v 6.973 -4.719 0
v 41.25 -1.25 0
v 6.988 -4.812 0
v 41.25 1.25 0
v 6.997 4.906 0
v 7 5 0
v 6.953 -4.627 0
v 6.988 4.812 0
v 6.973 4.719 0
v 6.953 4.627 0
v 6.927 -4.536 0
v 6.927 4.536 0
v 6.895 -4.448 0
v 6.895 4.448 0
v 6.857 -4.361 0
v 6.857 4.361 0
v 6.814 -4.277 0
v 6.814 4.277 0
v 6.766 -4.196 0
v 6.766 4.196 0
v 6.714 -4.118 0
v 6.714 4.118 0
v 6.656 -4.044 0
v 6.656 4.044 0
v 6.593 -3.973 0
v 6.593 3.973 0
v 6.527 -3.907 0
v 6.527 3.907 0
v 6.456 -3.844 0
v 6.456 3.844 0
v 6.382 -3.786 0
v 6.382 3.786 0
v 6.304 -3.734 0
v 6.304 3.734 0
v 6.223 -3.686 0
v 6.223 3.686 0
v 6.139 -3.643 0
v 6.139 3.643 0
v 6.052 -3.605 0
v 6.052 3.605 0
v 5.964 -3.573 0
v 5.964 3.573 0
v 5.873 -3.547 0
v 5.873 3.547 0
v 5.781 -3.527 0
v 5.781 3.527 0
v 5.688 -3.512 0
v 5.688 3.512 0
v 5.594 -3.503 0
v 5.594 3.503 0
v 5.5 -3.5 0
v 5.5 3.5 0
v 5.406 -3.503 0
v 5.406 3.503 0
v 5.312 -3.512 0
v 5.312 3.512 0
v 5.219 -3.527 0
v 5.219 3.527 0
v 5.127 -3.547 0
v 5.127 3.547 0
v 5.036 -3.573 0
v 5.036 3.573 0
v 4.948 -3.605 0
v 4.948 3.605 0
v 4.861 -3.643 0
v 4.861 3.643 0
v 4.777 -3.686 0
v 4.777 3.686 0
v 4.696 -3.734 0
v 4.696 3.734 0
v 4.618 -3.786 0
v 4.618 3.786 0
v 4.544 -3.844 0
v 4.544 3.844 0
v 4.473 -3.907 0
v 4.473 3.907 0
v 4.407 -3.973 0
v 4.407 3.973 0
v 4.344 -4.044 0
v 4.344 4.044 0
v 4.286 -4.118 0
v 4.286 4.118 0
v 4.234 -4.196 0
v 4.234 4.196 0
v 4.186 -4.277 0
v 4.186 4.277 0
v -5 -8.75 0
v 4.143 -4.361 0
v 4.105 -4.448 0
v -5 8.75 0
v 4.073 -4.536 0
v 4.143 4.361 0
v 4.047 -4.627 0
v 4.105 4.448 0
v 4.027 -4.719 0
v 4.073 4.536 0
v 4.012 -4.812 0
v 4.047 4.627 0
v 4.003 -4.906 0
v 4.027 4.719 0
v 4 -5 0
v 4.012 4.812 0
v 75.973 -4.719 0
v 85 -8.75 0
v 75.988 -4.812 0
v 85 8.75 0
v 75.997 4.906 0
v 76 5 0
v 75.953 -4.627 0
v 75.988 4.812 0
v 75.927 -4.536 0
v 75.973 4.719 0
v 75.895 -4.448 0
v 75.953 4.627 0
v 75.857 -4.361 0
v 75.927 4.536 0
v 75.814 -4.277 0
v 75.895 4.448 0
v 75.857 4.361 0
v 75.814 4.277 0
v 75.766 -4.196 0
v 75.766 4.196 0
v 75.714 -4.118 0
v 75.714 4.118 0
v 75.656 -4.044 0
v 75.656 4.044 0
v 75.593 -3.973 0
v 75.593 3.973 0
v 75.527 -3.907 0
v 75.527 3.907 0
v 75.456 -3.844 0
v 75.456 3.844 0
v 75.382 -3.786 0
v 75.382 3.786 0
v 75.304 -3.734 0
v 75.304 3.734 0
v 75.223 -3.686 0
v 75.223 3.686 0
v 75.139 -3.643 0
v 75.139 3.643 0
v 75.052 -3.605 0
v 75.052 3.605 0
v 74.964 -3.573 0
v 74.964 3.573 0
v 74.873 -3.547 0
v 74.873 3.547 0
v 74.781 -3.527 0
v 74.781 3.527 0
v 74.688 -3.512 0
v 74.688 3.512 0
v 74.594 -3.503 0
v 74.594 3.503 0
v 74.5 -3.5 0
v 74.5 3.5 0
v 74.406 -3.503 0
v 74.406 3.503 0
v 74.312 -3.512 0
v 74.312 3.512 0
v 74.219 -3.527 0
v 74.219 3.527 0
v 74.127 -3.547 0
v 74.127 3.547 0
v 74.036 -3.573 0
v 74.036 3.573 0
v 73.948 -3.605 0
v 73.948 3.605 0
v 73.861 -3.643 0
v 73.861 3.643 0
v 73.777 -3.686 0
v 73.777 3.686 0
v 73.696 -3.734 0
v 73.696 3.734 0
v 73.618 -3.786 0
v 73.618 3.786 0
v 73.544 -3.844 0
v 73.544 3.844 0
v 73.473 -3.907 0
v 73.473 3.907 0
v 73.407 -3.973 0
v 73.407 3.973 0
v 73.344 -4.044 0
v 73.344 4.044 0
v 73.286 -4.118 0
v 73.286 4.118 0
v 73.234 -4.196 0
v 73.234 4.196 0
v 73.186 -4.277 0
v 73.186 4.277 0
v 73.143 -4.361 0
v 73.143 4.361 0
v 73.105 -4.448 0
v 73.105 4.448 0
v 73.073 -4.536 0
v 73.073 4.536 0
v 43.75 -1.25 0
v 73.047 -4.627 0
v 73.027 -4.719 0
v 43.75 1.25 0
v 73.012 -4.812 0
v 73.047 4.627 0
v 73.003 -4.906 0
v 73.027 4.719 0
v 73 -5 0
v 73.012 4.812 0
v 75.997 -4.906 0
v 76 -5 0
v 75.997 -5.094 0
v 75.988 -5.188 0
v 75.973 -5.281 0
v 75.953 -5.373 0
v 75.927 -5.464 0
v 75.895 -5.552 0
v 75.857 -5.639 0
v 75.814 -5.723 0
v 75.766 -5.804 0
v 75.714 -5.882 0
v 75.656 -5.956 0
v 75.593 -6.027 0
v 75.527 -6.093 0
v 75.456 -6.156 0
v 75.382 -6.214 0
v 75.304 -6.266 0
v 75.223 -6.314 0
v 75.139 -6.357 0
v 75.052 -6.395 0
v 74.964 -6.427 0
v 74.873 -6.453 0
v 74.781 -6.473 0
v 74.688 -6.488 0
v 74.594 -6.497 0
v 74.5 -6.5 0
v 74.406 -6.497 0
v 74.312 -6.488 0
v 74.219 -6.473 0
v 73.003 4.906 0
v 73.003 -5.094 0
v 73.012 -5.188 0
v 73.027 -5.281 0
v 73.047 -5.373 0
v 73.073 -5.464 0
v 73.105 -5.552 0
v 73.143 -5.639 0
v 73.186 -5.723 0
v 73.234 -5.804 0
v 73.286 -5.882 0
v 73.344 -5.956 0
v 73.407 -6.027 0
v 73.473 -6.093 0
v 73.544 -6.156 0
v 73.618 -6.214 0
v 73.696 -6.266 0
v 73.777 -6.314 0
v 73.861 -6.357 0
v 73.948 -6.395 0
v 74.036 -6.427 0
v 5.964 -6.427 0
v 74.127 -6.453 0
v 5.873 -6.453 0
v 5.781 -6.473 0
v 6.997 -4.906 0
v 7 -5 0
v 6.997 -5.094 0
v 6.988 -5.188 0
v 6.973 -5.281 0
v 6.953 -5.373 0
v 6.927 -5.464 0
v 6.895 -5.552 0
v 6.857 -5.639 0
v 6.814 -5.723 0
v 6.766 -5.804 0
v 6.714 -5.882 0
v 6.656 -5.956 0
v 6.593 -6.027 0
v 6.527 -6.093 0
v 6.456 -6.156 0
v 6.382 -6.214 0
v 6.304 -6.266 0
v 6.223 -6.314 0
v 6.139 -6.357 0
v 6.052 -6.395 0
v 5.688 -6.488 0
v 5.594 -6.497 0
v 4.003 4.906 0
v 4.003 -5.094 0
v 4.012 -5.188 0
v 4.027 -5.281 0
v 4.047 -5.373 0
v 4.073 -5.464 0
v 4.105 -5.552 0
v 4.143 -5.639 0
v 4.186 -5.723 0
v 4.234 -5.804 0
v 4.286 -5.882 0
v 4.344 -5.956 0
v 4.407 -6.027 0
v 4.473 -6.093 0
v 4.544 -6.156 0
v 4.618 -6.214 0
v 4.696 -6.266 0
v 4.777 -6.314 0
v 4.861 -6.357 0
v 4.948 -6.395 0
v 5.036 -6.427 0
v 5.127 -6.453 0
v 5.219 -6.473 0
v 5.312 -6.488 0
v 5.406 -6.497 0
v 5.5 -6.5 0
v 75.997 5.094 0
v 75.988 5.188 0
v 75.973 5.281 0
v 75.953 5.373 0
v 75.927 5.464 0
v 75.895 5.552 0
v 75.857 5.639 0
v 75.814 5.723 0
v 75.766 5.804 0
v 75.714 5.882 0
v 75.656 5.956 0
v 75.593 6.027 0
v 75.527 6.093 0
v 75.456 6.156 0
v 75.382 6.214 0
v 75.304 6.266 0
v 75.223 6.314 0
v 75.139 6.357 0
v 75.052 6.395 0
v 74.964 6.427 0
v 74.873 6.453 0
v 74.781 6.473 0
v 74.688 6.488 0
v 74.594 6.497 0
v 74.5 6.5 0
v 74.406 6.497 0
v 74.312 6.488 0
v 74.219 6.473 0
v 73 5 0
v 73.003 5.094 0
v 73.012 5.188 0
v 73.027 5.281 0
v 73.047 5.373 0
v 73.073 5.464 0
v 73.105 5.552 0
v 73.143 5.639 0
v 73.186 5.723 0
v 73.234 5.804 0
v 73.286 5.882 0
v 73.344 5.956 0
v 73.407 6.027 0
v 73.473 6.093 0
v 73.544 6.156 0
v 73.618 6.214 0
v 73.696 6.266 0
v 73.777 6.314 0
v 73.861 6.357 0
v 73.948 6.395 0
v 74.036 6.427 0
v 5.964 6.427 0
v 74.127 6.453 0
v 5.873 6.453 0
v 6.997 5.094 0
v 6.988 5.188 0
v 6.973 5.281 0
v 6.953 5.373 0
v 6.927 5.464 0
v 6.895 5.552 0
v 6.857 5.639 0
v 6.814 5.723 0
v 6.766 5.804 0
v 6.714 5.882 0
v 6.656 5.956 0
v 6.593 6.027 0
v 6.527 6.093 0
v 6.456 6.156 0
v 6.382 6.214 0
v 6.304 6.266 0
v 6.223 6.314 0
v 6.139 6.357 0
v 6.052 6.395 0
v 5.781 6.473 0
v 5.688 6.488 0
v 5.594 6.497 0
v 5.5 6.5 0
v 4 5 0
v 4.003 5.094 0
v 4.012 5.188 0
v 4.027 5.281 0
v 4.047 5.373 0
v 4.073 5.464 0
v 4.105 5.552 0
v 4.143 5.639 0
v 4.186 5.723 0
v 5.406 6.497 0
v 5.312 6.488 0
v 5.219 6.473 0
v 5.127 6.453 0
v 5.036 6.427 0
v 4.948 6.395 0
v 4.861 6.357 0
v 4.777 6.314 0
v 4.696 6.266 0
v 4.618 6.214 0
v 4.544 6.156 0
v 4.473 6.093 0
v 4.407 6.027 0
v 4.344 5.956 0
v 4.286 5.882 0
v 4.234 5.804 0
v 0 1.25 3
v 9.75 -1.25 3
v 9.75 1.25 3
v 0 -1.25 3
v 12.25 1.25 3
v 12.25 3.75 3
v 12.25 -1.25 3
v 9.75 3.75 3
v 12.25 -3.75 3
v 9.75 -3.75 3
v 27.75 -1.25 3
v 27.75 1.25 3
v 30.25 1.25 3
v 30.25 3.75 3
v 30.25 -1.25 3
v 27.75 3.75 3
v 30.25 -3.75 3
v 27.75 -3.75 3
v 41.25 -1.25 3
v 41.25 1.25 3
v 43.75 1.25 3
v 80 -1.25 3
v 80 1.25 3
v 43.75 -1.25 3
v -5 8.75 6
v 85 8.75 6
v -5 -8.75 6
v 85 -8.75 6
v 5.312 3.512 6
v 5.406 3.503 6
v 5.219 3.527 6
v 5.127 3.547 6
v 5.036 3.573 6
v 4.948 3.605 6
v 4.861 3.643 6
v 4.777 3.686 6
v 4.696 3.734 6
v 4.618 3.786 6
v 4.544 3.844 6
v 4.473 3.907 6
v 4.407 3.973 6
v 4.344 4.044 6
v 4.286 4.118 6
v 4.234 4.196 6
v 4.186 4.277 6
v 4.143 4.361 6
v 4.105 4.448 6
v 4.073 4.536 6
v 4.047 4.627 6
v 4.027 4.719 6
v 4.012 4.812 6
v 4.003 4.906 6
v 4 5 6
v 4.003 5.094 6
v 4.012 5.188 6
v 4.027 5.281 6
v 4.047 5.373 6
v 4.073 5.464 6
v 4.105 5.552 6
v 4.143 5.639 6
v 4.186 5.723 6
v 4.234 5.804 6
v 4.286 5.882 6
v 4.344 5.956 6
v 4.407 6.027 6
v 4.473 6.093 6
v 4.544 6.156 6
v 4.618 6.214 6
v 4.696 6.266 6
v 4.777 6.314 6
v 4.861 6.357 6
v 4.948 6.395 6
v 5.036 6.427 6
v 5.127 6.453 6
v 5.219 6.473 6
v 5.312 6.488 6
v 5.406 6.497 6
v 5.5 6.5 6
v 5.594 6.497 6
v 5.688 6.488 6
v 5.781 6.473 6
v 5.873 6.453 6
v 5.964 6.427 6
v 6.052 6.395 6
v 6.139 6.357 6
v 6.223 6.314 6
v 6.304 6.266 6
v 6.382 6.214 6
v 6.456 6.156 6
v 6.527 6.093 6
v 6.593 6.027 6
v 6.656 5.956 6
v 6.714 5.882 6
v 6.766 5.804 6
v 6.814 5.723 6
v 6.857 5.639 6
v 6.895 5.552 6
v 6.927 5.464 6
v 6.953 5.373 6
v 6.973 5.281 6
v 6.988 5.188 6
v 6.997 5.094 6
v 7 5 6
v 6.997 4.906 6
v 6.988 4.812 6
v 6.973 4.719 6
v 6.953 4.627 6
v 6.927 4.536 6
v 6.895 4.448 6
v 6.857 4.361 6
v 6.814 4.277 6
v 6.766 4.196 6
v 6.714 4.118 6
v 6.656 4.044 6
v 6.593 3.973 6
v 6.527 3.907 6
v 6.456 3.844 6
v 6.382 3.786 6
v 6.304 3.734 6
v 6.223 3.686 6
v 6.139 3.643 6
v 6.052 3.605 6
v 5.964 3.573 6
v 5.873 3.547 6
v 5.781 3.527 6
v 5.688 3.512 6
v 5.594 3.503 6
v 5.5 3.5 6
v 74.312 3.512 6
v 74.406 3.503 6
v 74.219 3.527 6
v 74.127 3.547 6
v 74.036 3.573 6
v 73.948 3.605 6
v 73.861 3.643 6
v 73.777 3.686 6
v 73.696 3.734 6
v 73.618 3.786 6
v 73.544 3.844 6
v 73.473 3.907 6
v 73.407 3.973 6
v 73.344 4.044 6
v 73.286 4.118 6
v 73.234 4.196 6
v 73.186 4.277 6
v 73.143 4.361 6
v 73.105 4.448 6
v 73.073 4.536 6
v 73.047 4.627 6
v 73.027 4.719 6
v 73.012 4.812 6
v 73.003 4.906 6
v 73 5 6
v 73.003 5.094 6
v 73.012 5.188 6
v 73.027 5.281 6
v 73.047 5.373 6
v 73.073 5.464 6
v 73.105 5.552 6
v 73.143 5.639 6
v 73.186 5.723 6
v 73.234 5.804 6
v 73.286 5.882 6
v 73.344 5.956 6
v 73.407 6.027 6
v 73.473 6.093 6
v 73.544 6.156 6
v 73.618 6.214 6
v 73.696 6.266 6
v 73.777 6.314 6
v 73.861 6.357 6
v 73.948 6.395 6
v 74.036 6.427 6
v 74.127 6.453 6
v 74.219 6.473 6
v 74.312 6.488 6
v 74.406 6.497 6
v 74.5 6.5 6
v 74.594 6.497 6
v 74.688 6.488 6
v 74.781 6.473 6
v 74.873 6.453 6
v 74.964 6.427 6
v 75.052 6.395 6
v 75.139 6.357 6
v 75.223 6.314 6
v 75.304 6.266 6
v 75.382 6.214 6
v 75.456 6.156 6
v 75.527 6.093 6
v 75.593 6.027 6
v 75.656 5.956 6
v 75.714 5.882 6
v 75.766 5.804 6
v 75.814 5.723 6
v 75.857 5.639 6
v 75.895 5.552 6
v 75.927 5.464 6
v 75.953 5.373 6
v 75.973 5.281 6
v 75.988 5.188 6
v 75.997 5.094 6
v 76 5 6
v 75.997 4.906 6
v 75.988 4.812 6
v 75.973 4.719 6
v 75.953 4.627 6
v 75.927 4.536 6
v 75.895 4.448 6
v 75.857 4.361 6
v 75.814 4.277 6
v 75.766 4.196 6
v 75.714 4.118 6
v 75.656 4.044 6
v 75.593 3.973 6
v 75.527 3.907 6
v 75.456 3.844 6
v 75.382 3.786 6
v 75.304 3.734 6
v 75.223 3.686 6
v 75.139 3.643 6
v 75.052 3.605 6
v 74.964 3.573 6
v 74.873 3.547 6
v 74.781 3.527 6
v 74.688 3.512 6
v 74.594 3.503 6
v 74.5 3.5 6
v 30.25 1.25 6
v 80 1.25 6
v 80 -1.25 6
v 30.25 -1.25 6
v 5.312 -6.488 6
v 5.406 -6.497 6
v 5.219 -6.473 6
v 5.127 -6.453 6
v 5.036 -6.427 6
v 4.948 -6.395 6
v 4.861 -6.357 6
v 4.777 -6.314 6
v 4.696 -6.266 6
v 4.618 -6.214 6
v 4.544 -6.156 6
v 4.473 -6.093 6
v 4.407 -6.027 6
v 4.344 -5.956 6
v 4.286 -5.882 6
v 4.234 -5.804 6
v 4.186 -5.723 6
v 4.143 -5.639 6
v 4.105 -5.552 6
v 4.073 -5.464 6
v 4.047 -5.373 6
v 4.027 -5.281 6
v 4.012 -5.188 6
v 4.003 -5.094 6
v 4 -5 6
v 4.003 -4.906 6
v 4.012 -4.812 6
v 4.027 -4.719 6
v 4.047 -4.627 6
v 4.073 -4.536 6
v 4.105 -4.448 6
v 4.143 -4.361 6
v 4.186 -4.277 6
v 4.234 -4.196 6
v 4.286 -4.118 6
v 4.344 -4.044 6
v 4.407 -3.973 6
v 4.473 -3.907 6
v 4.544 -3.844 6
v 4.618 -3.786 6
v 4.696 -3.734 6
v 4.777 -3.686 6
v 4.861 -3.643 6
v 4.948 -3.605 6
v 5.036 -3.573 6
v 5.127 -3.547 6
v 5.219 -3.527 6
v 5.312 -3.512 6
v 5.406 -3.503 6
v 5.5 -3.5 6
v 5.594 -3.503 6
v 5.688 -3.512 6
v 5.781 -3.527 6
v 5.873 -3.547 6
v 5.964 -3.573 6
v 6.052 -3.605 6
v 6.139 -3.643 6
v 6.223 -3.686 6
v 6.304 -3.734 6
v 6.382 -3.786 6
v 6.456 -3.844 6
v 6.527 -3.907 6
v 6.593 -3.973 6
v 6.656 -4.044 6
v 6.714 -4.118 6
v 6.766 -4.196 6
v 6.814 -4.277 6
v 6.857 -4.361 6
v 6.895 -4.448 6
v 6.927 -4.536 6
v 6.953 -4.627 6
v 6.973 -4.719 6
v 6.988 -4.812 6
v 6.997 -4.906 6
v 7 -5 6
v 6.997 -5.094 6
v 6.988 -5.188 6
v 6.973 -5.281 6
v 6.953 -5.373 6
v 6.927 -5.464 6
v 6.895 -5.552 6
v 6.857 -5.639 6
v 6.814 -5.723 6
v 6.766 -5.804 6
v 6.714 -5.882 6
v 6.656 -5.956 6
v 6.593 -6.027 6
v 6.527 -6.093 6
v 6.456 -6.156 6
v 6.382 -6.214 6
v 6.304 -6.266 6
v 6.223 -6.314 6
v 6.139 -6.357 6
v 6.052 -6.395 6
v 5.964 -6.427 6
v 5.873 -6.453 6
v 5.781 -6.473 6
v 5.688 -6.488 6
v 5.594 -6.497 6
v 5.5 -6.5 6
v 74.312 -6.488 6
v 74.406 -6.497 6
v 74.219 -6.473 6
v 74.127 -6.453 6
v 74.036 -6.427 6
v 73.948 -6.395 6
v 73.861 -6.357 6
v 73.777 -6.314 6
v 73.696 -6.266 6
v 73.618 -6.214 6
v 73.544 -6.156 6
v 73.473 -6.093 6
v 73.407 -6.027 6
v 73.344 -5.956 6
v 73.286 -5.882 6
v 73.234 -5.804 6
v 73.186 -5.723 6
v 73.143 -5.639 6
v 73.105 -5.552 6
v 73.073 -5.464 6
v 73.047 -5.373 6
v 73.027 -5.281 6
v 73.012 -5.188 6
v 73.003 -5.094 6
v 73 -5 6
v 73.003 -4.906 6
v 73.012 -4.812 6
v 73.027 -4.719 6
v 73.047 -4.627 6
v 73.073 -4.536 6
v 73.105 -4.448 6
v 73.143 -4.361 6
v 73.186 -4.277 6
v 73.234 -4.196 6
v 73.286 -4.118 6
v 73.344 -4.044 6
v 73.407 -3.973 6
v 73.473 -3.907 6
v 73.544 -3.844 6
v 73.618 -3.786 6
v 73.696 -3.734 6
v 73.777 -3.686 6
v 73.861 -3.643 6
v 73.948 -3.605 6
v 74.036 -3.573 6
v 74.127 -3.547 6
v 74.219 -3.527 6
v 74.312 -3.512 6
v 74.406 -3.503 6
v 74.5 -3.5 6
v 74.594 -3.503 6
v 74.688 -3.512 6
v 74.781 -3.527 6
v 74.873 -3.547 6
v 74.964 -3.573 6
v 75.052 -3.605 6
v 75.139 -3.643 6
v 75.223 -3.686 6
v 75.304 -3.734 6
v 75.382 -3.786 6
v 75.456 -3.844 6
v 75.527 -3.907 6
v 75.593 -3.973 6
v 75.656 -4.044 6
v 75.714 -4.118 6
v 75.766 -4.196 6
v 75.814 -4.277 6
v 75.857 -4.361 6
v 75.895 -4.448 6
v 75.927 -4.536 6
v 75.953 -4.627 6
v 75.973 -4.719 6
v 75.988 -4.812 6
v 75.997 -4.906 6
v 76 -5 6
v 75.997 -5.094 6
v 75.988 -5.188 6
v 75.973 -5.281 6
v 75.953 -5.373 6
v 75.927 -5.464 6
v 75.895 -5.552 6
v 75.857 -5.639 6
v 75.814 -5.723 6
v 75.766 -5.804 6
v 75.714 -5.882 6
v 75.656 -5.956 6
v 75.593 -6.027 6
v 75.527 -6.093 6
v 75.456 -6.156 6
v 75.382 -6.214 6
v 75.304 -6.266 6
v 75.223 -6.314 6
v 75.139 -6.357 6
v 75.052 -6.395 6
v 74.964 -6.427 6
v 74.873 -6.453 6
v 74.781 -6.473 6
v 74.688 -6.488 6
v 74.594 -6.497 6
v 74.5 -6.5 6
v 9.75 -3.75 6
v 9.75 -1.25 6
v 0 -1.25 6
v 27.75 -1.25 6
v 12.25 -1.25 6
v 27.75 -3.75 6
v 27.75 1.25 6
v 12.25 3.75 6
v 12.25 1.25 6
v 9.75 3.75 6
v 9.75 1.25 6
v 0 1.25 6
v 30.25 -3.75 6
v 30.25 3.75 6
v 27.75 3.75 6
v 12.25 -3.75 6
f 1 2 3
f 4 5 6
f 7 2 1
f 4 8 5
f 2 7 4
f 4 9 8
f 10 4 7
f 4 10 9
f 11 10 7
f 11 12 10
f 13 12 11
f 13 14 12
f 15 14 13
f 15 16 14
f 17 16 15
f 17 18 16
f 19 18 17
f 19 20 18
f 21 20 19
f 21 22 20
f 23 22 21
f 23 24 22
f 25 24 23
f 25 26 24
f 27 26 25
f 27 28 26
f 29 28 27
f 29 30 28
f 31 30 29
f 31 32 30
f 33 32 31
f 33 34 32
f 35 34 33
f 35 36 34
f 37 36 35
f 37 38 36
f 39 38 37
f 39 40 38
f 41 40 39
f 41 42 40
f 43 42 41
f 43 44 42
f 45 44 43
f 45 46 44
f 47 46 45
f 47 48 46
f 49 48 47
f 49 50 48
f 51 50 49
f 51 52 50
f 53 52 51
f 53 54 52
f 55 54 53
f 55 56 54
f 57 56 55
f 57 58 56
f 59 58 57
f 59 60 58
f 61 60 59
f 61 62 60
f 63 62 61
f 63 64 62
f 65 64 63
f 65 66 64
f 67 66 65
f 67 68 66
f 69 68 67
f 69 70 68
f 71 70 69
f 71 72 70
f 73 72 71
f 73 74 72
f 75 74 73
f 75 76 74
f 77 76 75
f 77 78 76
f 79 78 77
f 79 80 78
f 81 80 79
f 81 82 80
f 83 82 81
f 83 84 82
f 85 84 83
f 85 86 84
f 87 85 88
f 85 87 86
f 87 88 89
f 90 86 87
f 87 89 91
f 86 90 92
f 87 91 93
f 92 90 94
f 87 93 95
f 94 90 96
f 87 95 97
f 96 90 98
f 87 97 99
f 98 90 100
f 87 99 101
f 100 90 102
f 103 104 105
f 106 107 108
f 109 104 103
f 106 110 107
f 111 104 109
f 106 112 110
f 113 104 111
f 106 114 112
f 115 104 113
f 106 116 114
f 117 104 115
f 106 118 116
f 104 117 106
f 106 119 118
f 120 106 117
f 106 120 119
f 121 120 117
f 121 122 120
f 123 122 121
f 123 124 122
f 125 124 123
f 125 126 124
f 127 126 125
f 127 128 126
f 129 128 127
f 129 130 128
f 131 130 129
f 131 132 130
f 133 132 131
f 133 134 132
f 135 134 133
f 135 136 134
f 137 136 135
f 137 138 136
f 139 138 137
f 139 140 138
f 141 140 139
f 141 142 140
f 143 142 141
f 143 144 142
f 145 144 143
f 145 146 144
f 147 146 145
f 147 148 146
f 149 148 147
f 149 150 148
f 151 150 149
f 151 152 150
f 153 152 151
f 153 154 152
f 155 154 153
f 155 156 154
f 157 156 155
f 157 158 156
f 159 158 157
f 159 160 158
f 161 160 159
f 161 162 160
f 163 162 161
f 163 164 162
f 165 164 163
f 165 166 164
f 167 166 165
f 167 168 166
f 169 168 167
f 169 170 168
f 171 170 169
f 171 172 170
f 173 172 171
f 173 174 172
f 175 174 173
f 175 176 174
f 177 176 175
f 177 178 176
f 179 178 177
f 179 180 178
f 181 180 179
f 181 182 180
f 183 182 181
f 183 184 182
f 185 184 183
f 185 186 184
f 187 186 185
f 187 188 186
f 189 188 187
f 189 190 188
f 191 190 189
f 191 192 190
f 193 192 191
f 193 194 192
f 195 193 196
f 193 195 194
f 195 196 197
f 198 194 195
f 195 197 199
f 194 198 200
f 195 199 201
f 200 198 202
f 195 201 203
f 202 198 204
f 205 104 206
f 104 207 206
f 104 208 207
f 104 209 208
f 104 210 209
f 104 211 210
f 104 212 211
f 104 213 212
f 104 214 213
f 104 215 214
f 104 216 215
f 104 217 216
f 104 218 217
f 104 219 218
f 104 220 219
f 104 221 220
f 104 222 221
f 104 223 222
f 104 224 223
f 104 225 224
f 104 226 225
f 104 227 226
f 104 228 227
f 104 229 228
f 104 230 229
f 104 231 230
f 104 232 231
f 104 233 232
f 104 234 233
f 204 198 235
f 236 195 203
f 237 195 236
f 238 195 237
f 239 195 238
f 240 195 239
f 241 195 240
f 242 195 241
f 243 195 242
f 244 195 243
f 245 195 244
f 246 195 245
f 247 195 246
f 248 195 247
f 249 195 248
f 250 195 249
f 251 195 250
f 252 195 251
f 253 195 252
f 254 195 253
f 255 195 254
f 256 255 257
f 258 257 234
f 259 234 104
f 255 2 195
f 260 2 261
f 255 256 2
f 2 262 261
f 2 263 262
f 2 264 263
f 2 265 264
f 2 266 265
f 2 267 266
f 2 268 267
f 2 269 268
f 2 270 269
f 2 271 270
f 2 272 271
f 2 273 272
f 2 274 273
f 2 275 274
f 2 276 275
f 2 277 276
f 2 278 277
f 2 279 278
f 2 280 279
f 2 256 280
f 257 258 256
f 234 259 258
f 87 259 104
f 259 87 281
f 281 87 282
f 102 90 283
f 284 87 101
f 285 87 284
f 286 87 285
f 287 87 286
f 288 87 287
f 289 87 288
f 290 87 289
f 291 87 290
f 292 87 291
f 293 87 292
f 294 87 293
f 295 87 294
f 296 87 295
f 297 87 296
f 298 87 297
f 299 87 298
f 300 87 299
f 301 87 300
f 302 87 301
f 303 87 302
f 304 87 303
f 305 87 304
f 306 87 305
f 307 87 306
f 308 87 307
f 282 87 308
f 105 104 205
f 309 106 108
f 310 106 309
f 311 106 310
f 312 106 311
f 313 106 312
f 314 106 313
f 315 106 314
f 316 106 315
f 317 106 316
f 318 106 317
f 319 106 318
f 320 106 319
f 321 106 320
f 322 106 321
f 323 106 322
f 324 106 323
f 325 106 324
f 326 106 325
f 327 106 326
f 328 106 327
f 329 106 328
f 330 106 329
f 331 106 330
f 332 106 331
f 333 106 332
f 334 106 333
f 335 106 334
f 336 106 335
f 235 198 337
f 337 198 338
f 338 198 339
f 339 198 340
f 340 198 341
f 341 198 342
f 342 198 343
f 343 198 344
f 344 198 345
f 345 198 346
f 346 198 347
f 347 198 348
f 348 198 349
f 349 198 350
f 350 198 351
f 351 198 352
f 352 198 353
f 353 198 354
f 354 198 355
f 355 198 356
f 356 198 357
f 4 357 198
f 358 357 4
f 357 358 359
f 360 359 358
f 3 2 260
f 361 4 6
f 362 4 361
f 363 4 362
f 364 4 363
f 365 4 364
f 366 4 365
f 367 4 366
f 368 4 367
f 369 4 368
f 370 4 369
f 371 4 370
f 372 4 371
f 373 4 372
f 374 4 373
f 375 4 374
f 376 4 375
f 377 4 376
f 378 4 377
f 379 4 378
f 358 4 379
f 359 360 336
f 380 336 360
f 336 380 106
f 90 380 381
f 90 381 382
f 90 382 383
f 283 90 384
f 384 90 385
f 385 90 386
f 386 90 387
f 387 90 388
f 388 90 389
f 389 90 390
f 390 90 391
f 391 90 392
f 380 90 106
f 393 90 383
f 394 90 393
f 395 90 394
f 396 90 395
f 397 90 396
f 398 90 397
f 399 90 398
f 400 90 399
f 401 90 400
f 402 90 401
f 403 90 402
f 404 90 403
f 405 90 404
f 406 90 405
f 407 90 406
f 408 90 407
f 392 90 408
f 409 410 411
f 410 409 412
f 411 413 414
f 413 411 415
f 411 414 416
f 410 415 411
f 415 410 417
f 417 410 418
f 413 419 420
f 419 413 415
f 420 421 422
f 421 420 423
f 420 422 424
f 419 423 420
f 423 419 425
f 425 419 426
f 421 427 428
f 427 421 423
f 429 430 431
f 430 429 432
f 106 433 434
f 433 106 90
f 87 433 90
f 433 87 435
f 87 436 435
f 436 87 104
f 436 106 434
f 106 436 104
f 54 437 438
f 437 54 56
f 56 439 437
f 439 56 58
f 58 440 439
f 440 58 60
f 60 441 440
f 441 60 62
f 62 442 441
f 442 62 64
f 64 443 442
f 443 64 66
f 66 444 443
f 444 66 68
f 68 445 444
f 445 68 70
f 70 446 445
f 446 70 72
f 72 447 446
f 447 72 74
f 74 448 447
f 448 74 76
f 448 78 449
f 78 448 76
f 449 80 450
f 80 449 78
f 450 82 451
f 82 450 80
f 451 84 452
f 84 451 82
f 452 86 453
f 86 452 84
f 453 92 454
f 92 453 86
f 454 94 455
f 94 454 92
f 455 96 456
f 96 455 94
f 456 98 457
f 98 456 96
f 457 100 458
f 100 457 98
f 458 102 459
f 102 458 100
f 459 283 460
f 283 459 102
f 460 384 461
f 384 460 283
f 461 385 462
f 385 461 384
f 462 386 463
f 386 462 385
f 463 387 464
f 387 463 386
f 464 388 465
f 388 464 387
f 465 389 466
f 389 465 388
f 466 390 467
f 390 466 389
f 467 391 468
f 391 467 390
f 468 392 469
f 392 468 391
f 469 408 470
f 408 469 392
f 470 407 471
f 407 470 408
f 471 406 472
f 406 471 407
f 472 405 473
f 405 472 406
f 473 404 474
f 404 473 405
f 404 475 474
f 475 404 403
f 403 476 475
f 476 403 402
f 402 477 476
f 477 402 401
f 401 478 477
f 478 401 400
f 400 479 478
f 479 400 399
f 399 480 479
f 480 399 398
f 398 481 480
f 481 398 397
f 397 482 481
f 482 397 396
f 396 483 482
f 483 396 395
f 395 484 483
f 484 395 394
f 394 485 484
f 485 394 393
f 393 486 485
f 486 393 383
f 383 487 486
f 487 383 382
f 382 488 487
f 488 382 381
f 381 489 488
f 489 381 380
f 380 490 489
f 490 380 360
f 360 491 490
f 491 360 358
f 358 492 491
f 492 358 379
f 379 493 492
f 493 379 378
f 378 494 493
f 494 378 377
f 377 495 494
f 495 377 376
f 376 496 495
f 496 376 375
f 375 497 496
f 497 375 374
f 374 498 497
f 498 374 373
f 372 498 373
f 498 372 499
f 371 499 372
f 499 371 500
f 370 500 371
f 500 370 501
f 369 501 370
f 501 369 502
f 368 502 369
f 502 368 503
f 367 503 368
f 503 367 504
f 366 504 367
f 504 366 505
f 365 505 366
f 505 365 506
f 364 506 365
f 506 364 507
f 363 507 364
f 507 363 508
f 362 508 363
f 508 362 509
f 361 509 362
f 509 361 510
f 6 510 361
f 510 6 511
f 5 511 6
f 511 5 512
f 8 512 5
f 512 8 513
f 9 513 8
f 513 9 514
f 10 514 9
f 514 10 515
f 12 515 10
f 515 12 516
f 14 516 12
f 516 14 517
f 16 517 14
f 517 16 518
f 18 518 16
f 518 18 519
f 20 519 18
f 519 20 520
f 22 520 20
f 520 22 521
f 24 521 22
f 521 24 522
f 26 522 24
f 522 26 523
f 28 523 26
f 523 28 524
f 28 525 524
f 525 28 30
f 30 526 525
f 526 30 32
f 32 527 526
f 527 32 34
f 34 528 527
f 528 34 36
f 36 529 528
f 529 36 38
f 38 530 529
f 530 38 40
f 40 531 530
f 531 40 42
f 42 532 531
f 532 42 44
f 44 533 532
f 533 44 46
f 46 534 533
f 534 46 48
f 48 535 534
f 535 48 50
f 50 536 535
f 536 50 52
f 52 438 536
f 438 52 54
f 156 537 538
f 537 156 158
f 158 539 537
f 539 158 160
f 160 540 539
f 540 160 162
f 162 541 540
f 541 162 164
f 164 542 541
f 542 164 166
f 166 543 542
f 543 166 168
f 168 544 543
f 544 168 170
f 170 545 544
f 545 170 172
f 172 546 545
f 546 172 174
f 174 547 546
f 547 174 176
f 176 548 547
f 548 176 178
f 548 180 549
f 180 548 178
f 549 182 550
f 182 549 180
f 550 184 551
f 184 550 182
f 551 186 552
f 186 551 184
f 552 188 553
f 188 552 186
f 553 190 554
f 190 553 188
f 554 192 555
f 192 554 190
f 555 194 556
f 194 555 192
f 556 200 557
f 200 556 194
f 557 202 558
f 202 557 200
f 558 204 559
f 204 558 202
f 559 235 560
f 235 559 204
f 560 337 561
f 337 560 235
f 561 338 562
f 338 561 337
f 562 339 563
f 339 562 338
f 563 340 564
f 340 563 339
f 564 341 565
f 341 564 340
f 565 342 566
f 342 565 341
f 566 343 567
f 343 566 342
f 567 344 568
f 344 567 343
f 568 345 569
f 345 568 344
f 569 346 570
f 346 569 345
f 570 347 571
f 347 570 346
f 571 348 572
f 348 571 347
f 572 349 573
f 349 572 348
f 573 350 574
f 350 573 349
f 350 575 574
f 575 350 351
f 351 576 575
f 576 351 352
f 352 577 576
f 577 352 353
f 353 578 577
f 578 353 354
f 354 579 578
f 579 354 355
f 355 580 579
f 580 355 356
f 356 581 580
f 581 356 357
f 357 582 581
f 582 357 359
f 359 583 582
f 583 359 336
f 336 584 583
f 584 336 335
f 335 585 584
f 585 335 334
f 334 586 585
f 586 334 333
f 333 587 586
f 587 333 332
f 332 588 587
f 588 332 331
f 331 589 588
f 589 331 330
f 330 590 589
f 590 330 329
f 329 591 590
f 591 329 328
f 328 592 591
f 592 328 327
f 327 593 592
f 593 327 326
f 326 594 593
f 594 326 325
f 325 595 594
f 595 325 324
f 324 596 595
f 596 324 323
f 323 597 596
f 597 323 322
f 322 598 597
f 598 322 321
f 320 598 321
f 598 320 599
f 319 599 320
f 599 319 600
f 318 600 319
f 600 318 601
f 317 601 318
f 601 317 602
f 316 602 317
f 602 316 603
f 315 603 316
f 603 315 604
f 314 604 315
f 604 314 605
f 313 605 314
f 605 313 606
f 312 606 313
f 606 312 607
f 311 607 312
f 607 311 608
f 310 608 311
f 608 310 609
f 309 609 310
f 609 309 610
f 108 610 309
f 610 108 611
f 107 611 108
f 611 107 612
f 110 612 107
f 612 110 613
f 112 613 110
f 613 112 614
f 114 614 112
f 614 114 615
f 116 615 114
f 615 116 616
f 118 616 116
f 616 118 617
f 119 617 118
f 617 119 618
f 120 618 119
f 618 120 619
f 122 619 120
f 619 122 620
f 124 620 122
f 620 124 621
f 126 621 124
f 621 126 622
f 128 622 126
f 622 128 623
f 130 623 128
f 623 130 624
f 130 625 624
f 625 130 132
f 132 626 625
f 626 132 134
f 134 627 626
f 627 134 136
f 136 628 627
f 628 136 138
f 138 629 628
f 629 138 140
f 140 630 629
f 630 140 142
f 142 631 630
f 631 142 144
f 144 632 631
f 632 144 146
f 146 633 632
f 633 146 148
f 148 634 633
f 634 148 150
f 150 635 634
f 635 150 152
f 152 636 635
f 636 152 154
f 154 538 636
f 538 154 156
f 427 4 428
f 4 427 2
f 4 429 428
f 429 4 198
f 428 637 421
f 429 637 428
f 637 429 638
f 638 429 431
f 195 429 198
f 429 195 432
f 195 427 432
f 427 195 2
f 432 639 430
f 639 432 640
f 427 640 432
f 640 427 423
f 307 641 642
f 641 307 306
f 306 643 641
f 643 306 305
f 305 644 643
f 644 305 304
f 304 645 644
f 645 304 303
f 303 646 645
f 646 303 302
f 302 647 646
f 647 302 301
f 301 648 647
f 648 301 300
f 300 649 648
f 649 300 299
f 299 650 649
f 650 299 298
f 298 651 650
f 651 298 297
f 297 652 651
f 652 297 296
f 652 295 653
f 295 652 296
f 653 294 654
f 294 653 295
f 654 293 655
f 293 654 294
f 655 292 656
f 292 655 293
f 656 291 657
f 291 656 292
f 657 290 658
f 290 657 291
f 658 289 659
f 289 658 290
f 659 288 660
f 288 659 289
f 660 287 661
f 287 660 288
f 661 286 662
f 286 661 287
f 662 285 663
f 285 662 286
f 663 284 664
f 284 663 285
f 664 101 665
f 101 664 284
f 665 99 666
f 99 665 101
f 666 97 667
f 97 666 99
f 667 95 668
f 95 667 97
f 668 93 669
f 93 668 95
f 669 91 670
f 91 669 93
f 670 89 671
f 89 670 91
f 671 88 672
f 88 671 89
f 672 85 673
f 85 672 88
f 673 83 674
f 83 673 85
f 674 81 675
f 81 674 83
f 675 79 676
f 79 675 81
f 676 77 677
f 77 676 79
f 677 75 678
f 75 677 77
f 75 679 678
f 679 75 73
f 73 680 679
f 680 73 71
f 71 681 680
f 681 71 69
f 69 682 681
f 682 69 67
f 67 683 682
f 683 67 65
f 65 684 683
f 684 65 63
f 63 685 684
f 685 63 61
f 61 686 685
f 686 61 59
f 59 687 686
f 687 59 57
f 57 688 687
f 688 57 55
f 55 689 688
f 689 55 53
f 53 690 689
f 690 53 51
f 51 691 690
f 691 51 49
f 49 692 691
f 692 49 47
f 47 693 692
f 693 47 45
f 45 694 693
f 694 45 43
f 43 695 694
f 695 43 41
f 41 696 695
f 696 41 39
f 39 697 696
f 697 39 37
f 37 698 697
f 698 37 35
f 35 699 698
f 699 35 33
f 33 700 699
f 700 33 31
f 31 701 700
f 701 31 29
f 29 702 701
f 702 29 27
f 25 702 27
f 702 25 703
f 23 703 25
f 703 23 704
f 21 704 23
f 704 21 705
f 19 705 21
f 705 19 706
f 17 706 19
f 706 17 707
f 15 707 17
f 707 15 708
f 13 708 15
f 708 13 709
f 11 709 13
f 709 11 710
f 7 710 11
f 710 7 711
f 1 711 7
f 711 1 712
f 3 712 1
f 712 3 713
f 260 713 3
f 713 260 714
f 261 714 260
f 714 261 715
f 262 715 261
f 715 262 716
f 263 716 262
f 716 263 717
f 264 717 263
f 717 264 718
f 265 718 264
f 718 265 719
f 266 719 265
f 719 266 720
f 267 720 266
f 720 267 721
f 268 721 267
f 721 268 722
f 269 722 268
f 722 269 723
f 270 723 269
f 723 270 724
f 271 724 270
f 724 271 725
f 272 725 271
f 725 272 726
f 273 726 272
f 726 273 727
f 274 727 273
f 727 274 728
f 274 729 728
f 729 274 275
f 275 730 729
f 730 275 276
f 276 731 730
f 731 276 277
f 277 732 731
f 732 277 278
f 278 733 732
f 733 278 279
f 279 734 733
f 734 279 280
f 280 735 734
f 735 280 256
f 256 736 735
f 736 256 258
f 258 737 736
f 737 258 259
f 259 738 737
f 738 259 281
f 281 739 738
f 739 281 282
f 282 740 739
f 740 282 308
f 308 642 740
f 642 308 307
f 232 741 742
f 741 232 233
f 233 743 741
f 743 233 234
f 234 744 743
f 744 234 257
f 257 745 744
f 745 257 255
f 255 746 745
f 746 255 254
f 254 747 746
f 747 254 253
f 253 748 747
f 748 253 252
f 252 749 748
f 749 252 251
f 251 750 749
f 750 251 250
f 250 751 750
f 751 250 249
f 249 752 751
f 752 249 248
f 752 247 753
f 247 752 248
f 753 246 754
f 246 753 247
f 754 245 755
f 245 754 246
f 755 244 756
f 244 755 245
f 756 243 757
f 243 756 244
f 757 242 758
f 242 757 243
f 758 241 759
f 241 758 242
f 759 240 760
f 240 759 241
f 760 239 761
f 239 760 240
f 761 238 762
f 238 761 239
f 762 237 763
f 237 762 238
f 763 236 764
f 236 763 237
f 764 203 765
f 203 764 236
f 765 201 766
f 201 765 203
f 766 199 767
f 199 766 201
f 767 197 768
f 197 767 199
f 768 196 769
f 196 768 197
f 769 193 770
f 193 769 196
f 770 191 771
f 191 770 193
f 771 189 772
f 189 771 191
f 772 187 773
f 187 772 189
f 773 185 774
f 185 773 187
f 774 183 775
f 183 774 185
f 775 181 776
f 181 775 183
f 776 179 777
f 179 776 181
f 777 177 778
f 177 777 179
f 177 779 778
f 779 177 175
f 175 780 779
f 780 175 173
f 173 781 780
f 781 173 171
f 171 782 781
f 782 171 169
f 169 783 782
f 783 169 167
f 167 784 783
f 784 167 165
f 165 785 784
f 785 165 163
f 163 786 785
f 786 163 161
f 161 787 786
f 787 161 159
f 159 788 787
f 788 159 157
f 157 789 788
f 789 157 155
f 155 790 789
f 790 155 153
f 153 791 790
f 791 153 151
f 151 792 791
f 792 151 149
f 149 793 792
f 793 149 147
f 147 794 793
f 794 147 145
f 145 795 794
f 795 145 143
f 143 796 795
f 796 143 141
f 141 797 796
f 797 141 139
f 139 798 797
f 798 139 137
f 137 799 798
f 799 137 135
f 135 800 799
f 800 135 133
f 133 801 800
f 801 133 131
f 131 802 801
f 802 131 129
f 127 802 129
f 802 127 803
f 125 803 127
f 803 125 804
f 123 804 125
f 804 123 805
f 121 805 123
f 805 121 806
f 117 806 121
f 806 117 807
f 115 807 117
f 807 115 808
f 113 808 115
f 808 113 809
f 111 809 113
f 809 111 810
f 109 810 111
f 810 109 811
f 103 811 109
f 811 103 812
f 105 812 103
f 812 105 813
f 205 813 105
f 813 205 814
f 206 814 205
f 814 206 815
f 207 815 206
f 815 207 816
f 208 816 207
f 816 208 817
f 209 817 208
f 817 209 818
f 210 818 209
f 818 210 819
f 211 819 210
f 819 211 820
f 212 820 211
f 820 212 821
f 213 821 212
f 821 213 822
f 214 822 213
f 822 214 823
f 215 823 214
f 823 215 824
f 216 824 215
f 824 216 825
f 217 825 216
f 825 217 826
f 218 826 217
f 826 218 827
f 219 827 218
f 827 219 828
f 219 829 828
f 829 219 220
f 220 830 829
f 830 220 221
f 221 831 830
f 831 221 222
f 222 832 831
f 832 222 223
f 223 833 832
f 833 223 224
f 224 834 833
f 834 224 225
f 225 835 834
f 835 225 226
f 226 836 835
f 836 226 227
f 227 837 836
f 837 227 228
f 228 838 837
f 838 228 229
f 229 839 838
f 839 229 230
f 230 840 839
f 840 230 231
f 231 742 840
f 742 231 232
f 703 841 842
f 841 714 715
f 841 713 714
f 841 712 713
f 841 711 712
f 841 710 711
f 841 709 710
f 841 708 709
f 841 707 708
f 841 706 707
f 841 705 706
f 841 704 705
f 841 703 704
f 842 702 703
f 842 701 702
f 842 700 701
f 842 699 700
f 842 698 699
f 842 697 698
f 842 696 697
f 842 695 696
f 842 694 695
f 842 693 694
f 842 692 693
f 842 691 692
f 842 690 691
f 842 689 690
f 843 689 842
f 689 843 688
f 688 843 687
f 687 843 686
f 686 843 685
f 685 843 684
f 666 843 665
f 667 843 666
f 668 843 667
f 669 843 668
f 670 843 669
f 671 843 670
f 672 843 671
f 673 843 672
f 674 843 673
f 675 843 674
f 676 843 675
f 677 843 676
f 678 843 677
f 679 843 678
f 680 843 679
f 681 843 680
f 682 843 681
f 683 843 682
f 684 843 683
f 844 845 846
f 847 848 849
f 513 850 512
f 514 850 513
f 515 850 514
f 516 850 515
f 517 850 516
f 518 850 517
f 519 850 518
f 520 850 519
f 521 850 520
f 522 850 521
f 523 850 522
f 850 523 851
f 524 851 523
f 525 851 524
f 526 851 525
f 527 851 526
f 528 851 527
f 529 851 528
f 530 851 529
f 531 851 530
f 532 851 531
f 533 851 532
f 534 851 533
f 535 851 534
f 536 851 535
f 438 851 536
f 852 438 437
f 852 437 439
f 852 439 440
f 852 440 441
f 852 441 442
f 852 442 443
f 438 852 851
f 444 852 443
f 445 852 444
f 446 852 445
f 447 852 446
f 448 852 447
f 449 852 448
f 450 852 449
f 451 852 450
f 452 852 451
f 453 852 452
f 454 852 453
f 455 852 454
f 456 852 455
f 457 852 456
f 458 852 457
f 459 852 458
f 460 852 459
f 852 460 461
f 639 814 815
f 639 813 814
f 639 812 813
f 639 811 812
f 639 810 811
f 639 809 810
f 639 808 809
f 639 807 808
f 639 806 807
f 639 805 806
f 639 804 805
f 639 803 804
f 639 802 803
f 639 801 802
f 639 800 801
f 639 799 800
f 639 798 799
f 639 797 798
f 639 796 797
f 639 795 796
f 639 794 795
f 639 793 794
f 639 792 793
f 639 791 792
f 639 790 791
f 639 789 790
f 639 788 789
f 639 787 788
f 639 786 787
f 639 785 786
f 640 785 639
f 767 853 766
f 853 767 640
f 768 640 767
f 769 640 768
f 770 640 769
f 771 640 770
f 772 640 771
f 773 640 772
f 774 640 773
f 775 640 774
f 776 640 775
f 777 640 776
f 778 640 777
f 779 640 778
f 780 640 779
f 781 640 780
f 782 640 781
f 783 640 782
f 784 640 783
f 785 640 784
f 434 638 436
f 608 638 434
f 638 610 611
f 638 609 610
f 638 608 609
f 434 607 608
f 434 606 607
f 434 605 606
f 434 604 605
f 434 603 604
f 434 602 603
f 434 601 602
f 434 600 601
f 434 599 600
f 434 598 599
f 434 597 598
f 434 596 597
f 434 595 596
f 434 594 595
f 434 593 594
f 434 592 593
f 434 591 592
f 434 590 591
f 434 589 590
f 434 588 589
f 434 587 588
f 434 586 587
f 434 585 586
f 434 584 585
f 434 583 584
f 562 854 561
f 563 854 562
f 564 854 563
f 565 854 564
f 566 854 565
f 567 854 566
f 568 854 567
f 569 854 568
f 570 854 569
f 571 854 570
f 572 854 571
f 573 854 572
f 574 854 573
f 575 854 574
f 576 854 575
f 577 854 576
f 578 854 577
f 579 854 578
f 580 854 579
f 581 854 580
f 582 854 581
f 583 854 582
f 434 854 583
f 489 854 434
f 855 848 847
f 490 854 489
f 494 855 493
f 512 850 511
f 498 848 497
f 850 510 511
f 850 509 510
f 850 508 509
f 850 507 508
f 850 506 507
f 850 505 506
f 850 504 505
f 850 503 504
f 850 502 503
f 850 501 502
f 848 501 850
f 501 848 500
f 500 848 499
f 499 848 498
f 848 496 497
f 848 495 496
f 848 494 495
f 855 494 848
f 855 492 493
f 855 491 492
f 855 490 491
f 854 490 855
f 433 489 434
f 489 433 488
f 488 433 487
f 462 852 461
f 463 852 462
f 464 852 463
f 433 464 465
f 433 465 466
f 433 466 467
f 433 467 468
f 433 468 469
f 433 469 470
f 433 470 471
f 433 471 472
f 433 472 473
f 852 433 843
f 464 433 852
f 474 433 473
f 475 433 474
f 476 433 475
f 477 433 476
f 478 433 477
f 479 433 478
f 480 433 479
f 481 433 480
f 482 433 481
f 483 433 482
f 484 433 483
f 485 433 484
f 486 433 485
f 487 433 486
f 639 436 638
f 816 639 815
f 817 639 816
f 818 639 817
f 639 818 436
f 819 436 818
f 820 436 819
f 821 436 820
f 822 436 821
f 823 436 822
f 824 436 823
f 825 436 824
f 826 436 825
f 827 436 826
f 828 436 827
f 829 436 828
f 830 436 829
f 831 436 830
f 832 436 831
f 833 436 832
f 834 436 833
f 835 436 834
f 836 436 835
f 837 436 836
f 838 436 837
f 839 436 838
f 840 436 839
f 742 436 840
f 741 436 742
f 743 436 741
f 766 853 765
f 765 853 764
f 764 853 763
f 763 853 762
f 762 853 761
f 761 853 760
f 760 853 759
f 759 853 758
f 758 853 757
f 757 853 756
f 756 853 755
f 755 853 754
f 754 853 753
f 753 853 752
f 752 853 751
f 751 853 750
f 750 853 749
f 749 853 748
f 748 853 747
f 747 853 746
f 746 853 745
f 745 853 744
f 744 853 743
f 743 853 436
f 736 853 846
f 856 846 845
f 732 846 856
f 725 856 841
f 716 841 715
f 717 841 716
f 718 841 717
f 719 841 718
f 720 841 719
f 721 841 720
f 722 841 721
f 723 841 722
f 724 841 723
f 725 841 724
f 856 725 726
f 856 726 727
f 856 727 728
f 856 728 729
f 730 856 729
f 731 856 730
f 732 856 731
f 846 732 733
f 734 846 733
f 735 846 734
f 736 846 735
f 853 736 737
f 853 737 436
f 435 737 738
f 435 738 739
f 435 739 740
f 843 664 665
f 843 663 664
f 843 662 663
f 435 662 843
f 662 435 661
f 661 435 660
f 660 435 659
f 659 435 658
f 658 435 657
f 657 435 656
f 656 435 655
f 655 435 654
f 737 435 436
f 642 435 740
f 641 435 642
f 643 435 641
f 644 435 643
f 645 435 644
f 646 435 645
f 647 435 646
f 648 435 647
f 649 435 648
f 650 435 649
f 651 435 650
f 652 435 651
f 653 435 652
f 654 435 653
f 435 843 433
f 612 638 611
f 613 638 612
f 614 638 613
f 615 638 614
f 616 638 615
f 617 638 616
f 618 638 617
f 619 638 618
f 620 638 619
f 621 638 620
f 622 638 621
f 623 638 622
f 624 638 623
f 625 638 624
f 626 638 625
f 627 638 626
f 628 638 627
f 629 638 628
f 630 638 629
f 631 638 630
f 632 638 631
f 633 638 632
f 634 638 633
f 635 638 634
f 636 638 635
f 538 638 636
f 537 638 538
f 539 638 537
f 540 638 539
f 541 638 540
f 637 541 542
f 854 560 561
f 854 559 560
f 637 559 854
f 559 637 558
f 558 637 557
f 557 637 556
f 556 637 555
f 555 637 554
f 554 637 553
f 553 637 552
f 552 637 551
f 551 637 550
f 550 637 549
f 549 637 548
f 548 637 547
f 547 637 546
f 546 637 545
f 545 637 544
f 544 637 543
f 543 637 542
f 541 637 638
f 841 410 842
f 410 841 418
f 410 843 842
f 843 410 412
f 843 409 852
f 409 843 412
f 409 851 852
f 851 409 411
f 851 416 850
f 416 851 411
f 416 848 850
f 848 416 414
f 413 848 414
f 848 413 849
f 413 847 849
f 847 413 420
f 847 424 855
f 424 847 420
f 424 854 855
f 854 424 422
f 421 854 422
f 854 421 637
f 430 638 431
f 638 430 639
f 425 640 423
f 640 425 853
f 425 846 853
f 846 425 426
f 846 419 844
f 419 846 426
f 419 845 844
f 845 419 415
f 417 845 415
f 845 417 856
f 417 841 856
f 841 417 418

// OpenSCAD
// file: strip-wire-hold-base.scad
include <strip-wire-measurements.scad>

paddingWidth = wallThickness * 2 + 2 * toolWidth;
holdWidth = paddingWidth + wireD;
$fn=100;

module stripWireHoldBase() {
    difference() {
        translate([ - wallThickness, - wallThickness - toolWidth - (wireD / 2)]) {
            square([wallThickness * 2 + stockLength, holdWidth]);
        }

        translate([stripLength / 2, -wireD/2 -paddingWidth / 4]) {
            circle(boltM/2);
        }

        translate([stripLength / 2, wireD/2 + paddingWidth / 4]) {
            circle(boltM/2);
        }

        translate([stockLength - stripLength / 2, -wireD/2 -paddingWidth / 4]) {
            circle(boltM/2);
        }

        translate([stockLength - stripLength / 2, wireD/2 + paddingWidth / 4]) {
            circle(boltM/2);
        }

        translate([wireLength + toolR, -toolR]) {
            square([toolWidth, toolWidth]);
        }
    }
}

stripWireHoldBase();
// file: strip-wire-hold.scad
include <strip-wire-measurements.scad>

paddingWidth = wallThickness * 2 + 2 * toolWidth;
holdWidth = paddingWidth + wireD;

$fn=100;

module stripWireHold() {
    difference() {
        translate([ - wallThickness, - wallThickness - toolWidth - (wireD / 2)]) {
            square([wallThickness * 2 + stockLength, holdWidth]);
        }

        translate([stripLength / 2, -wireD/2 -paddingWidth / 4]) {
            circle(boltM/2);
        }

        translate([stripLength / 2, wireD/2 + paddingWidth / 4]) {
            circle(boltM/2);
        }

        translate([stockLength - stripLength / 2, -wireD/2 -paddingWidth / 4]) {
            circle(boltM/2);
        }

        translate([stockLength - stripLength / 2, wireD/2 + paddingWidth / 4]) {
            circle(boltM/2);
        }

        translate([0, -wireD/2]) {
            square([stockLength, wireD]);
        }

        translate([stripLength - toolR, -toolWidth - (wireD / 2)]) {
            square([toolWidth, 2 * toolWidth + wireD]);
        }

        translate([wireLength - stripLength - toolR, -toolWidth - (wireD / 2)]) {
            square([toolWidth, 2 * toolWidth + wireD]);
        }

    }
}

stripWireHold();
// file: strip-wire-measurements.scad
stripLength = 11;
toolWidth = 2.5;
toolR = toolWidth / 2;
wireD = 2.5;
wireLength = 40;
stockLength = 80;
wallThickness = 5;
boltM=3;
sheetThickness = 3;
// main file
include <strip-wire-measurements.scad>
use <strip-wire-hold.scad>
use <strip-wire-hold-base.scad>

translate([0,0,0]) {
    linear_extrude(height=sheetThickness) stripWireHoldBase();
}

translate([0,0,sheetThickness]) {
    linear_extrude(height=sheetThickness) stripWireHold();
}
